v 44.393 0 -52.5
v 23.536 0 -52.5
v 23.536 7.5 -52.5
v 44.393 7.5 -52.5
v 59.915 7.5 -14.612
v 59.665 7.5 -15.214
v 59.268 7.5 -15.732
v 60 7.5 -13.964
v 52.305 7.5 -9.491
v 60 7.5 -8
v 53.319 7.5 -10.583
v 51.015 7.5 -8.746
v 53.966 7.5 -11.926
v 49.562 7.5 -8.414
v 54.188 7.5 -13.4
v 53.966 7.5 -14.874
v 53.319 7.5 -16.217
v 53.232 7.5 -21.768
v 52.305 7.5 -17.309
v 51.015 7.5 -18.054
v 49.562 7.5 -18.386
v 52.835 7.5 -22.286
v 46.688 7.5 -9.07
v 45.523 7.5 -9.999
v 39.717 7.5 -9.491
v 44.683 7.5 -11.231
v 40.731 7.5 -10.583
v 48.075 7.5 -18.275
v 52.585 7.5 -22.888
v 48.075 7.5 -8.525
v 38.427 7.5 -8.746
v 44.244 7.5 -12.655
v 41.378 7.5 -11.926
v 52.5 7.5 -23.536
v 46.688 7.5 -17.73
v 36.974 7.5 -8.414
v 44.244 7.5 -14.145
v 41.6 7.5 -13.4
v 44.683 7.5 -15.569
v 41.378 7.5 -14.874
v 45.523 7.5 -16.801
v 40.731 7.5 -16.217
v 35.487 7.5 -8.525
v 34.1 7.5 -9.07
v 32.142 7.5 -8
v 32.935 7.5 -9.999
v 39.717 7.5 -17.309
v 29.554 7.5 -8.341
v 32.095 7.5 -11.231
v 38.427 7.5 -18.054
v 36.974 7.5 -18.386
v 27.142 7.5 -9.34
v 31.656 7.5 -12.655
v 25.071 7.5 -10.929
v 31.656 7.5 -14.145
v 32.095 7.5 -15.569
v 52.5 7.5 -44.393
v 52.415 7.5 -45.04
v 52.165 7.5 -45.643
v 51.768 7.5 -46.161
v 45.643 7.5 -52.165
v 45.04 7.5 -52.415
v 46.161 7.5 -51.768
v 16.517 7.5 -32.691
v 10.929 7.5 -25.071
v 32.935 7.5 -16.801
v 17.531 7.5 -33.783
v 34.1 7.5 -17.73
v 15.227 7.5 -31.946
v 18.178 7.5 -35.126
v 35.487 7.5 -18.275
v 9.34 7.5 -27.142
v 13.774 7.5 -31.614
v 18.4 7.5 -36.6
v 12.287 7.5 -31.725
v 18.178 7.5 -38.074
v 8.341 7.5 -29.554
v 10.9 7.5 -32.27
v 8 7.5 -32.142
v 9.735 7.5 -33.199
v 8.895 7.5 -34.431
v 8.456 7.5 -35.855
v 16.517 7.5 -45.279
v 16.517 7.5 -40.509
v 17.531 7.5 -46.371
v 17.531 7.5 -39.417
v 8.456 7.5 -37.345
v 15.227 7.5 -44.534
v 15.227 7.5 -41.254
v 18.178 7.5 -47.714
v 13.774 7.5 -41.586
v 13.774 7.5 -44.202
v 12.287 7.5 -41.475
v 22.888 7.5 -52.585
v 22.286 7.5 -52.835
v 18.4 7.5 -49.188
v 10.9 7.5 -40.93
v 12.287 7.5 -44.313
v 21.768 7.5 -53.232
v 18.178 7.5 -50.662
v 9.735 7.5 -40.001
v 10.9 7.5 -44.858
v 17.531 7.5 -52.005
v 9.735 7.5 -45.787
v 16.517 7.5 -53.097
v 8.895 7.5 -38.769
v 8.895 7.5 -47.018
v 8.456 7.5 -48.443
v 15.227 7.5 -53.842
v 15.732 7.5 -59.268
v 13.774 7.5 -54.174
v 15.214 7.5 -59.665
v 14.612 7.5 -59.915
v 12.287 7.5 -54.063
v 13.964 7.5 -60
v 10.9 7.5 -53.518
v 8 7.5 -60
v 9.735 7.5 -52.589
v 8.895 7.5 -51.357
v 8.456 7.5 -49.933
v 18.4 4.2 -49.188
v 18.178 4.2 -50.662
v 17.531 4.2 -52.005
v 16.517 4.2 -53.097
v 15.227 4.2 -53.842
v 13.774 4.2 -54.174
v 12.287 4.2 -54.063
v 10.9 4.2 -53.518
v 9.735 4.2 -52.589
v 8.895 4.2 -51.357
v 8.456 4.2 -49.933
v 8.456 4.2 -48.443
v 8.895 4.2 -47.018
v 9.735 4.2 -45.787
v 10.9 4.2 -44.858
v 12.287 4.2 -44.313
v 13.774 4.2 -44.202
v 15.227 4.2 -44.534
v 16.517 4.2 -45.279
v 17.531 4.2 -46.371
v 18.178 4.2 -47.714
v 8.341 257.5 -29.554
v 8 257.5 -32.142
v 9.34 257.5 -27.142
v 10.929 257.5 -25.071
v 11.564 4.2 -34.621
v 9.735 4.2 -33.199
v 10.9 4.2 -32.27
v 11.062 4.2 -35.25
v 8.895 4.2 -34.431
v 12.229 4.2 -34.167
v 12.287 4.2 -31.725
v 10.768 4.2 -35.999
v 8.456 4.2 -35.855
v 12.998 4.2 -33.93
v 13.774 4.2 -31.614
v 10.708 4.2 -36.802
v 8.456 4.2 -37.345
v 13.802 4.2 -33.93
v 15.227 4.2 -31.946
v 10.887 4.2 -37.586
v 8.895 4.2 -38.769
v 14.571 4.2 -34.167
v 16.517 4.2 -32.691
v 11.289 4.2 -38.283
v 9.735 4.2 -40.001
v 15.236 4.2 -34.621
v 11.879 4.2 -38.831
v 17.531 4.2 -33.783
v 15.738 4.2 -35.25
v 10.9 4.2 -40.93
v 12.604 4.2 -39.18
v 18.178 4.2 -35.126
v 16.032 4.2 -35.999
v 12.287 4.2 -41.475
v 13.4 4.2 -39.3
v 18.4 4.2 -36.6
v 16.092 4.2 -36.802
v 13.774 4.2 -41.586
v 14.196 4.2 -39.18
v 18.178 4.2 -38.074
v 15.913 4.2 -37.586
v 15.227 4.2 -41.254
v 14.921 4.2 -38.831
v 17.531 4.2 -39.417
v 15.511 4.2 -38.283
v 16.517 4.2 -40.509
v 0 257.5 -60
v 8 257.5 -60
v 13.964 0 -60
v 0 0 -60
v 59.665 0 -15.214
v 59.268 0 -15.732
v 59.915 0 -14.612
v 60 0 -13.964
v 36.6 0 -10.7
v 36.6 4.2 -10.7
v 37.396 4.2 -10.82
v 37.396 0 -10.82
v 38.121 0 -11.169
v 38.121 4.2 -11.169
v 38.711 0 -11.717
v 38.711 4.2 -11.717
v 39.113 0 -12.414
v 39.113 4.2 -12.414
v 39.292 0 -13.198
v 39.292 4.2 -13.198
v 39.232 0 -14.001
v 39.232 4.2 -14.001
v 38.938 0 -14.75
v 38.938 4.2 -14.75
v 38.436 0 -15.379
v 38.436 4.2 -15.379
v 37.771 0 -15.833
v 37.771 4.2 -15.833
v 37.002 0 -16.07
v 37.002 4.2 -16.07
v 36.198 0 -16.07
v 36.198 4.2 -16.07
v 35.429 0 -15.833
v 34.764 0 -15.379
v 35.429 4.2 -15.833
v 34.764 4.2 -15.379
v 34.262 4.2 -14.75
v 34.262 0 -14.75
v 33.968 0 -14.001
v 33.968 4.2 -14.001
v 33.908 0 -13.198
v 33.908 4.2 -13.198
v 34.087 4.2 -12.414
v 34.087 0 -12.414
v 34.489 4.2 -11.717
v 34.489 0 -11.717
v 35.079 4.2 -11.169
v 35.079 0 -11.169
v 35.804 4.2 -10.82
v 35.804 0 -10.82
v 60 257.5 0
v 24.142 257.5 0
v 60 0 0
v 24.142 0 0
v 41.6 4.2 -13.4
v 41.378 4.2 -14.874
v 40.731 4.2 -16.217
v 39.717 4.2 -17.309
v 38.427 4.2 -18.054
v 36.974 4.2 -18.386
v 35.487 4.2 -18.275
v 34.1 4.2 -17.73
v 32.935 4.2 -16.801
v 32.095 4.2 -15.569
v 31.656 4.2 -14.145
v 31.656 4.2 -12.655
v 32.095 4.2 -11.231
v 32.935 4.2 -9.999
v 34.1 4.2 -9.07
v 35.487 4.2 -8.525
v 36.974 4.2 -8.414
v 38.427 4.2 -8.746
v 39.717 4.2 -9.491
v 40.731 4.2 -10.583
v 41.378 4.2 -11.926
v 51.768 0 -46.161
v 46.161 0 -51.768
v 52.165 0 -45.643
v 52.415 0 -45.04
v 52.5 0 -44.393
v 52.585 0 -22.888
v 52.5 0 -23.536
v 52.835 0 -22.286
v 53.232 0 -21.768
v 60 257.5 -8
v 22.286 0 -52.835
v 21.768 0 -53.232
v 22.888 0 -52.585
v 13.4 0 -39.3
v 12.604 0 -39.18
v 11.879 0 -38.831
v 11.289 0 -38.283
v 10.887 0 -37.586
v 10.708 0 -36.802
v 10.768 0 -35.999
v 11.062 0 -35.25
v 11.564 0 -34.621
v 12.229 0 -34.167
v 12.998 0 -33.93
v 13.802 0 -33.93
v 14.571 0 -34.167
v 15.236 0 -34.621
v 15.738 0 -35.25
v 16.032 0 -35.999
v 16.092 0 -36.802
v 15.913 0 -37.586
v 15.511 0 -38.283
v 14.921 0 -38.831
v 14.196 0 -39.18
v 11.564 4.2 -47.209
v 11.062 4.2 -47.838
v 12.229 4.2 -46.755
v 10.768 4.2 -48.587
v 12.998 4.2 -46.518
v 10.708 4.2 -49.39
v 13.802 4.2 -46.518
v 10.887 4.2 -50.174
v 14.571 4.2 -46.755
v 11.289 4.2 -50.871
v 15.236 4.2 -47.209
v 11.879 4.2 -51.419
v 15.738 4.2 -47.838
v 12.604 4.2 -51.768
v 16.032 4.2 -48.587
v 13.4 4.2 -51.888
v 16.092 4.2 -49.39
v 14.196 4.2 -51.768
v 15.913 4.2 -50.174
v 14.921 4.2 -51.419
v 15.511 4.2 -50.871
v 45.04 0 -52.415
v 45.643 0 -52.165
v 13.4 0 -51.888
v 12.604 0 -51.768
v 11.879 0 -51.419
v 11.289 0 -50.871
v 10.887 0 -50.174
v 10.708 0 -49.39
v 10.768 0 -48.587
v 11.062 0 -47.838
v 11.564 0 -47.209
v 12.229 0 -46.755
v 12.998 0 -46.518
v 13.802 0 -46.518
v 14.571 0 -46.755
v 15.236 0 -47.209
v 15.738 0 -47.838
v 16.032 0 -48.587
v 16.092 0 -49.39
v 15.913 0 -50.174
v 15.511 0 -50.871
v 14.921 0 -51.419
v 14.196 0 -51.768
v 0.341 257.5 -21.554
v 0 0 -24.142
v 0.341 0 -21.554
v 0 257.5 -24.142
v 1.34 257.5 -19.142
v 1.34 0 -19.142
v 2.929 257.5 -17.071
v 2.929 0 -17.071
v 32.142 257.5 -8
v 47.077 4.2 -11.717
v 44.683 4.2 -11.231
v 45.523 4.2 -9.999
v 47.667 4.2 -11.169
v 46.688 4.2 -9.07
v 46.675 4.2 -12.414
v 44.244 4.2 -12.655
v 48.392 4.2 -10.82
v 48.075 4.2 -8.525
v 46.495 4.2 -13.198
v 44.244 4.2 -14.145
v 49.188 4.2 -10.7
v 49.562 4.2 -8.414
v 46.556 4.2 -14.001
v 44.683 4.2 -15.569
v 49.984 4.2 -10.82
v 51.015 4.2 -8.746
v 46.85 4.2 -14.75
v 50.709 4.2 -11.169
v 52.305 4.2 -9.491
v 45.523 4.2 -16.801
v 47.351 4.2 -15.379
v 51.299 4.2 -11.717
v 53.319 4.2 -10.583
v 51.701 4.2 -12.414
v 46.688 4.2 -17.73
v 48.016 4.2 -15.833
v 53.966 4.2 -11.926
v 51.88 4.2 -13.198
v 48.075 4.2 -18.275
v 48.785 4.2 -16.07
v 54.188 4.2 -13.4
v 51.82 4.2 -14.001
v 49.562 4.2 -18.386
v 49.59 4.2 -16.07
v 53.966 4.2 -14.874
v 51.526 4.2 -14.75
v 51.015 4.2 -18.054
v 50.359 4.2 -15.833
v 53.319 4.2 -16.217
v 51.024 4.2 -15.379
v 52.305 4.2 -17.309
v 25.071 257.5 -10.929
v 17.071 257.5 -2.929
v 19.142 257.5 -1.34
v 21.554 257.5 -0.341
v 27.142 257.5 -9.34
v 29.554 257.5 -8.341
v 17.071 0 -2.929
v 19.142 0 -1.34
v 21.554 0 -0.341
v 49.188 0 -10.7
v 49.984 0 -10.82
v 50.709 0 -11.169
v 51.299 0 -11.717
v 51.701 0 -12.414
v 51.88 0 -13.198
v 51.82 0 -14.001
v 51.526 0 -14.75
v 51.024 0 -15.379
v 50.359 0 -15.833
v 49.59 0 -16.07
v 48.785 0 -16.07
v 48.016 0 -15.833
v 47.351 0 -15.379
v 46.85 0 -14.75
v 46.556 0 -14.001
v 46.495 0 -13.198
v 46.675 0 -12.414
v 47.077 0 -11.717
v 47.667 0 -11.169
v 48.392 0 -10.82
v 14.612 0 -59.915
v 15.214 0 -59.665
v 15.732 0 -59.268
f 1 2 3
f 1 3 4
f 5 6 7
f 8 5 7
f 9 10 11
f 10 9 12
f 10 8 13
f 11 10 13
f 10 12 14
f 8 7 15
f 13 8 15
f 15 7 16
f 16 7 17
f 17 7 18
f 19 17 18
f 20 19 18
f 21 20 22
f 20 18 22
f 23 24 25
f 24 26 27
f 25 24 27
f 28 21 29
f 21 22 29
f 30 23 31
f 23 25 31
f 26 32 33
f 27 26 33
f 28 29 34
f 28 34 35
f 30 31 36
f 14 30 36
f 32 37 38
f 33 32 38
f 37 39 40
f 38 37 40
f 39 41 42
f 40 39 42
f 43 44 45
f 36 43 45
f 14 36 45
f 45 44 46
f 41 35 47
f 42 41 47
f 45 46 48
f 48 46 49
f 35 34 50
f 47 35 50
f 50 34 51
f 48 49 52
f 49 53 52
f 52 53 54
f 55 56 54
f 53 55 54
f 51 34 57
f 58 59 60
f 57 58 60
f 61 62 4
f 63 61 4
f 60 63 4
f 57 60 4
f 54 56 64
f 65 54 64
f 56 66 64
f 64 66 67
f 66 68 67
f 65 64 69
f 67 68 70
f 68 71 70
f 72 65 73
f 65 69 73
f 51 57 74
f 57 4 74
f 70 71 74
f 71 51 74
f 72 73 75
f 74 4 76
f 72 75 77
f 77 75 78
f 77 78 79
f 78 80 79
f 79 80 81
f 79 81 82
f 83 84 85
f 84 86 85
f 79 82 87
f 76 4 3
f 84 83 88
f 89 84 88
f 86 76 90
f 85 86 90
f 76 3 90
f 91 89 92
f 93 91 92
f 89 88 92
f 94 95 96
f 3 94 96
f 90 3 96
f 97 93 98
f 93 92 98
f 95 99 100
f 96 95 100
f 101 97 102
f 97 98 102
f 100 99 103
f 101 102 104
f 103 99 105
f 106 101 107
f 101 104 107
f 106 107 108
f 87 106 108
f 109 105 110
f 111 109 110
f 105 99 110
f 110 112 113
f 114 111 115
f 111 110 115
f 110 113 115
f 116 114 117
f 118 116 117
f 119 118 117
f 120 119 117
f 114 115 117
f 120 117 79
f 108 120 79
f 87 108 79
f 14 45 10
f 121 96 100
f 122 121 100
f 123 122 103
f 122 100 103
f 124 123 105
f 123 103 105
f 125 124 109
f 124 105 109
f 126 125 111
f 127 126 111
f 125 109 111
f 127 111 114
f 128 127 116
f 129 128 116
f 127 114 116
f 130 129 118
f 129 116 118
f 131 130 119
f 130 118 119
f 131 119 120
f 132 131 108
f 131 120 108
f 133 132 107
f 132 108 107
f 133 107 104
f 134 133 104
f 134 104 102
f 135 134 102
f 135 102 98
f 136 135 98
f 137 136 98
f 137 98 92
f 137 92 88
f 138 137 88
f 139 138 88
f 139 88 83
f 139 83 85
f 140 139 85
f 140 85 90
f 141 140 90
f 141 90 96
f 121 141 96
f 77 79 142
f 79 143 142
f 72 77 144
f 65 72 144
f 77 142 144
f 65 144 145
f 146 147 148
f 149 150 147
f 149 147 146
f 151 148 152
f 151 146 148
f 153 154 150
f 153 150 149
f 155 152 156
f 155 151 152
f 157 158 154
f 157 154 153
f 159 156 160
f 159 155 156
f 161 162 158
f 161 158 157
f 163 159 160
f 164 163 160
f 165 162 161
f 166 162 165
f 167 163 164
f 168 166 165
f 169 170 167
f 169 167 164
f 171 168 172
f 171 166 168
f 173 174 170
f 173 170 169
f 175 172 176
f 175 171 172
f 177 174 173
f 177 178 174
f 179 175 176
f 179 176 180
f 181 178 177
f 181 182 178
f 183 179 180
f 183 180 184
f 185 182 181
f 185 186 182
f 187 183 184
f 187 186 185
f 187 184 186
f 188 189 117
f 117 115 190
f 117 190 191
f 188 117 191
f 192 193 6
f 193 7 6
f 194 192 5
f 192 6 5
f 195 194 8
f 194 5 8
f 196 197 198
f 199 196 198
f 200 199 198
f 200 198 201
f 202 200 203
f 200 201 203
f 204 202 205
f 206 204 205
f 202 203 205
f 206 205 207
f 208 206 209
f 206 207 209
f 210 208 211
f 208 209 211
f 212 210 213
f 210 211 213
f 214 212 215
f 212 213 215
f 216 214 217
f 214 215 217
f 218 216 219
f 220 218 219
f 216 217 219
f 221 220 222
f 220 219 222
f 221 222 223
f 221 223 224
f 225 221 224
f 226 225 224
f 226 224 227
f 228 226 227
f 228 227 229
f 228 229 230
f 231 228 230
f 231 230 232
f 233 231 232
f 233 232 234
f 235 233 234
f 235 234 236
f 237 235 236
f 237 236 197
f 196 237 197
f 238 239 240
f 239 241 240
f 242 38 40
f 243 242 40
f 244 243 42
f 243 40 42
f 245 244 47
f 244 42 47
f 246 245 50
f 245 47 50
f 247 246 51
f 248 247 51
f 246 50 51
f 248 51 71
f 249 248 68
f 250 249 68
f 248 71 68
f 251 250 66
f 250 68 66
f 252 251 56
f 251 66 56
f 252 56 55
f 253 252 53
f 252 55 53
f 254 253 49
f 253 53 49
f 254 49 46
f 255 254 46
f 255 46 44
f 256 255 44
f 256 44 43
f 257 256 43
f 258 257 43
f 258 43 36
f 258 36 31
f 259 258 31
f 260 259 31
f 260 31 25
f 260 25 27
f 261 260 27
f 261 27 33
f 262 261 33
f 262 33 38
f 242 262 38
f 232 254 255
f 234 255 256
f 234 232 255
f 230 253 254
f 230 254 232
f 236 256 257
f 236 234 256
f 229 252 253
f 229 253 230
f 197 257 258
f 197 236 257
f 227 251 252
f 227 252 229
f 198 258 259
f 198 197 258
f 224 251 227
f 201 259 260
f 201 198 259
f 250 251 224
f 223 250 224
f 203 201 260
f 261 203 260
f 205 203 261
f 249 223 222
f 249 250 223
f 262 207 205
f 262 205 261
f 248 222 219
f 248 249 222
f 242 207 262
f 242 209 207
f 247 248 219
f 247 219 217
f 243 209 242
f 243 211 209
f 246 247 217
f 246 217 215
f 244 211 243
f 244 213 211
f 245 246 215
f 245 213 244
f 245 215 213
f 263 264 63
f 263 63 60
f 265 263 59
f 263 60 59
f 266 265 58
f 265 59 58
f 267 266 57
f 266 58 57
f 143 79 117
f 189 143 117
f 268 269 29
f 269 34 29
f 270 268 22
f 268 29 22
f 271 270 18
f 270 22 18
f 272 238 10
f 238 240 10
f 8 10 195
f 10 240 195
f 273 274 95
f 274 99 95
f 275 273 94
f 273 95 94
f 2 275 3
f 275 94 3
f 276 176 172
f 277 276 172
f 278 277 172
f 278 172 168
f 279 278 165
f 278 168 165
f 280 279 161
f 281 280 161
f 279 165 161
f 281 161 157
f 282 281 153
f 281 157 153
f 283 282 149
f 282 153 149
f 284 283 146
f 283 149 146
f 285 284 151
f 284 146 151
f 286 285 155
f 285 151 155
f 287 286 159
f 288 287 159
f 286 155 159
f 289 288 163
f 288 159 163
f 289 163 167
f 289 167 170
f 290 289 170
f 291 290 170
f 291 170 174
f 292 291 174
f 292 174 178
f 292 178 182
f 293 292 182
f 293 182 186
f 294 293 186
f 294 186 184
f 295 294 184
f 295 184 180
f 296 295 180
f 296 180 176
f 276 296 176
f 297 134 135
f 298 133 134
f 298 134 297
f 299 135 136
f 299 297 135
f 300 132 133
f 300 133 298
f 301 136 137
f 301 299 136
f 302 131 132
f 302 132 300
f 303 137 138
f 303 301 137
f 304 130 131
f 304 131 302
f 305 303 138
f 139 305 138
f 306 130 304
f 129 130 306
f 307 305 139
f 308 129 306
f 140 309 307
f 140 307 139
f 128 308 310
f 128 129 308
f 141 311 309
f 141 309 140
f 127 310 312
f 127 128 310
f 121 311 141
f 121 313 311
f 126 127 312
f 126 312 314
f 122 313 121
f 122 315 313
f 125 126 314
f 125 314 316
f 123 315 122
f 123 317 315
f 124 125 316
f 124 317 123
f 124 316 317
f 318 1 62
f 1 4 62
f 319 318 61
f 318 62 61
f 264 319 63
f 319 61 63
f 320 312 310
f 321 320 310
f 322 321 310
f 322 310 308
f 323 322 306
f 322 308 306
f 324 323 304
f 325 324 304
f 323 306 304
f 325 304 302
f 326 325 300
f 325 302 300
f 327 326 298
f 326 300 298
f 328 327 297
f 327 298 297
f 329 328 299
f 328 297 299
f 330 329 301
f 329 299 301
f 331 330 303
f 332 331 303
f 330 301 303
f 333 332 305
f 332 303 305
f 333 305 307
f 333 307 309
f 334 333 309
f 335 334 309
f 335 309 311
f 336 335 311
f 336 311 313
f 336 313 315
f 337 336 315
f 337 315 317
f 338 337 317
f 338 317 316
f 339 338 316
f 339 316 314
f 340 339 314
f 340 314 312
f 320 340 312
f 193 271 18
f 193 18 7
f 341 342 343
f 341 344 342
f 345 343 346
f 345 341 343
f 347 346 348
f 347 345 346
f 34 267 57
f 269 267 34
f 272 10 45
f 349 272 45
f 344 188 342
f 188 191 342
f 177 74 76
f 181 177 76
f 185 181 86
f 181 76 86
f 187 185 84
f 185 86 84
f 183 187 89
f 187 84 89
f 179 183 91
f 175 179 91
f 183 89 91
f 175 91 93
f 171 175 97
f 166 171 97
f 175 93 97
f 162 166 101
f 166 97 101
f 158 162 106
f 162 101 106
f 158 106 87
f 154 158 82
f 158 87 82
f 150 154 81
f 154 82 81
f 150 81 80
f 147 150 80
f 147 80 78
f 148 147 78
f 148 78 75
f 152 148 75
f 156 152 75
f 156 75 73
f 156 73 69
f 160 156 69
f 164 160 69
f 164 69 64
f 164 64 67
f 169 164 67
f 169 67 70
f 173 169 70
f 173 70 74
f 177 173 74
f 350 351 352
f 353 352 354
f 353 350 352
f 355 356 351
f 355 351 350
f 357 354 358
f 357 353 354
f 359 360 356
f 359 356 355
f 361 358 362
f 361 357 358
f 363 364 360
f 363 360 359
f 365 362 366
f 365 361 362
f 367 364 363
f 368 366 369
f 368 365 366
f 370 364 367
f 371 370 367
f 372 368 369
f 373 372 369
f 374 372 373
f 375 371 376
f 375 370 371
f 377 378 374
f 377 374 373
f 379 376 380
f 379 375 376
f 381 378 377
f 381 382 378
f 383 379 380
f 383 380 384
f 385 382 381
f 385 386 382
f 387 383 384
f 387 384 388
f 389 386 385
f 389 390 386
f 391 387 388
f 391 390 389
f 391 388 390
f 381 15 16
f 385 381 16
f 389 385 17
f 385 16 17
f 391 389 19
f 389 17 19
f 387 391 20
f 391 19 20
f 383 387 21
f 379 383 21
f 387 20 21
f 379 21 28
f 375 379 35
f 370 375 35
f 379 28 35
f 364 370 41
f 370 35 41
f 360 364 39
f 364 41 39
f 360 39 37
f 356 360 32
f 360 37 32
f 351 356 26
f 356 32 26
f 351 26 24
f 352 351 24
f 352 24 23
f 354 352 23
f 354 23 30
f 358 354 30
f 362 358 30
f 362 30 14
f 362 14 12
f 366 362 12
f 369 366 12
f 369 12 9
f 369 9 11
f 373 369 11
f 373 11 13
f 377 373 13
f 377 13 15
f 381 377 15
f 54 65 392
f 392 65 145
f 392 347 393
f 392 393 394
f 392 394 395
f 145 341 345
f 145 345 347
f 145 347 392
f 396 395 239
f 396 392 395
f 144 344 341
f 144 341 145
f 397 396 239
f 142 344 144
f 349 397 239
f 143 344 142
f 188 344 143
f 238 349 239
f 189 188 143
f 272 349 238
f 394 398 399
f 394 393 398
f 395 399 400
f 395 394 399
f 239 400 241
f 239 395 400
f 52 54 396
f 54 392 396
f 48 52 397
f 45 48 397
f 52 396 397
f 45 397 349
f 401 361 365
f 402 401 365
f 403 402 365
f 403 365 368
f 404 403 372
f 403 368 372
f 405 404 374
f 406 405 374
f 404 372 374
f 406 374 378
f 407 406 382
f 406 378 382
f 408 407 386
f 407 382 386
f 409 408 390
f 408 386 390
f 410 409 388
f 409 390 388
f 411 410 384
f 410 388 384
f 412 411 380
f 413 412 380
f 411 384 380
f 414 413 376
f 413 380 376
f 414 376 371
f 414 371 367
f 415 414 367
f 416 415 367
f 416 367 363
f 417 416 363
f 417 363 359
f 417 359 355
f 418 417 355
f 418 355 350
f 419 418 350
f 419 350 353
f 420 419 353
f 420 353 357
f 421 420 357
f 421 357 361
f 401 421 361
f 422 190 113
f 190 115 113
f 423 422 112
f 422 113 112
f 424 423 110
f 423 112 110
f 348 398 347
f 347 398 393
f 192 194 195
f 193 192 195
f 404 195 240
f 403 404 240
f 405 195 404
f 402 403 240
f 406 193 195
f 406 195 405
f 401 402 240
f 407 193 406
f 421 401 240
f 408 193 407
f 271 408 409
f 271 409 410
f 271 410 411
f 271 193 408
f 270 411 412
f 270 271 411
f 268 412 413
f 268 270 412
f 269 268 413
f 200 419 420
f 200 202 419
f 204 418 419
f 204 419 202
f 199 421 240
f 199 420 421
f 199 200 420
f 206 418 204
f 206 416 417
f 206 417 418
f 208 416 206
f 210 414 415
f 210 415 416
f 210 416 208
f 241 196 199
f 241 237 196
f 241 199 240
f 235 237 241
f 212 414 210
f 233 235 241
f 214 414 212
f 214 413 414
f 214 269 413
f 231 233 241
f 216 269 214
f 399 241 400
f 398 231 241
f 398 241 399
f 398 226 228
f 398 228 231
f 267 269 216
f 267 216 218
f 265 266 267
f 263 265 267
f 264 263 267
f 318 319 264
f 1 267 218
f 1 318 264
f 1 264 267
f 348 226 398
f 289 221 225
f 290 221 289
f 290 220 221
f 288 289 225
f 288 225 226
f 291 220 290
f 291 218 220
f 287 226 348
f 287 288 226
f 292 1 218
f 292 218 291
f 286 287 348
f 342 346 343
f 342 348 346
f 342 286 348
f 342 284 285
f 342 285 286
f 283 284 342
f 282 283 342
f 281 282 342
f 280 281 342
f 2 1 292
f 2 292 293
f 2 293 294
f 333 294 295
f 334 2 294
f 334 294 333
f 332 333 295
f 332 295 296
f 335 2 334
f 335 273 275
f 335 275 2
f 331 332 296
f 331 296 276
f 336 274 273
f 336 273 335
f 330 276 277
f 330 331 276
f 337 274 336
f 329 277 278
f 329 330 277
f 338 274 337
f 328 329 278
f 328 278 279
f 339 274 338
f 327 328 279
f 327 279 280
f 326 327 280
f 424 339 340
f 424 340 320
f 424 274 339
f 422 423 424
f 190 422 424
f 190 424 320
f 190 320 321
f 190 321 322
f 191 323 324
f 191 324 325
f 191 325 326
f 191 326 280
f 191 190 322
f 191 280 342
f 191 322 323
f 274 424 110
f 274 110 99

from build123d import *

# Parameters (mm, degrees)
BOSS_EXTRUDE1_DEPTH                                  = 7.5
FILLET1_R                                            = 2.5
BOSS_EXTRUDE2_DEPTH                                  = 250
CHAMFER1_SIZE                                        = 20
FILLET2_R                                            = 10
SKETCH3_R                                            = 2.7
CUT_EXTRUDE1_DEPTH                                   = 265.007575649
REFRENTADO_PARA_TORNILLO_CON_CABEZA_PLAN_D           = 5.3
REFRENTADO_PARA_TORNILLO_CON_CABEZA_PLAN_CBORE_D     = 10
REFRENTADO_PARA_TORNILLO_CON_CABEZA_PLAN_CBORE_DEPTH = 3.3


with BuildPart() as part:
    # Sketch1 → Boss-Extrude1 (new body)
    with BuildSketch(Plane(origin=(0, 0, 0), x_dir=(1, 0, 0), z_dir=(0, 1, 0))):
        Polygon((0, 0), (0, 60), (15, 60), (22.5, 52.5), (45.428932188, 52.5), (52.5, 45.428932188), (52.5, 22.5), (60, 15), (60, 0), align=None)
    extrude(amount=BOSS_EXTRUDE1_DEPTH)

    # Fillet1
    fillet1_edges = [part.edges().sort_by_distance(p)[0] for p in [
        (15, 3.75, -60),
        (22.5, 3.75, -52.5),
        (45.428932188, 3.75, -52.5),
        (52.5, 3.75, -45.428932188),
        (52.5, 3.75, -22.5),
        (60, 3.75, -15),
    ]]
    fillet(fillet1_edges, radius=FILLET1_R)

    # Sketch2 → Boss-Extrude2 (add)
    with BuildSketch(Plane(origin=(0, 7.5, 0), x_dir=(1, 0, 0), z_dir=(0, 1, 0))):
        Polygon((0, 60), (0, 0), (60, 0), (60, 8), (8, 8), (8, 60), align=None)
    extrude(amount=BOSS_EXTRUDE2_DEPTH)

    # Chamfer1
    chamfer1_edges = [part.edges().sort_by_distance(p)[0] for p in [
        (0, 128.75, 0),
        (8, 132.5, -8),
    ]]
    chamfer(chamfer1_edges, length=CHAMFER1_SIZE)

    # Fillet2
    fillet2_edges = [part.edges().sort_by_distance(p)[0] for p in [
        (20, 128.75, 0),
        (0, 128.75, -20),
        (8, 132.5, -28),
        (28, 132.5, -8),
    ]]
    fillet(fillet2_edges, radius=FILLET2_R)

    # Sketch3 → Cut-Extrude1 (cut, through all)
    with BuildSketch(Plane(origin=(0, 7.5, 0), x_dir=(1, 0, 0), z_dir=(0, 1, 0))):
        with Locations(Location((36.6, 13.4, 0), (0, 0, 270))):
            Circle(SKETCH3_R)
        with Locations(Location((49.187905991, 13.4, 0), (0, 0, 270))):
            Circle(SKETCH3_R)
        with Locations(Location((13.4, 49.187905991, 0), (0, 0, 90))):
            Circle(SKETCH3_R)
        with Locations(Location((13.4, 36.6, 0), (0, 0, 90))):
            Circle(SKETCH3_R)
    extrude(amount=-CUT_EXTRUDE1_DEPTH, mode=Mode.SUBTRACT)

    # Refrentado para tornillo con cabeza plana de M51 (through all)
    with Locations(Plane(origin=(0, 7.5, 0), x_dir=(1, 0, 0), z_dir=(0, 1, 0))):
        with Locations((13.4, 49.187905991), (13.4, 36.6), (36.6, 13.4), (49.187905991, 13.4)):
            CounterBoreHole(REFRENTADO_PARA_TORNILLO_CON_CABEZA_PLAN_D / 2, REFRENTADO_PARA_TORNILLO_CON_CABEZA_PLAN_CBORE_D / 2, REFRENTADO_PARA_TORNILLO_CON_CABEZA_PLAN_CBORE_DEPTH)


solid = part.part
